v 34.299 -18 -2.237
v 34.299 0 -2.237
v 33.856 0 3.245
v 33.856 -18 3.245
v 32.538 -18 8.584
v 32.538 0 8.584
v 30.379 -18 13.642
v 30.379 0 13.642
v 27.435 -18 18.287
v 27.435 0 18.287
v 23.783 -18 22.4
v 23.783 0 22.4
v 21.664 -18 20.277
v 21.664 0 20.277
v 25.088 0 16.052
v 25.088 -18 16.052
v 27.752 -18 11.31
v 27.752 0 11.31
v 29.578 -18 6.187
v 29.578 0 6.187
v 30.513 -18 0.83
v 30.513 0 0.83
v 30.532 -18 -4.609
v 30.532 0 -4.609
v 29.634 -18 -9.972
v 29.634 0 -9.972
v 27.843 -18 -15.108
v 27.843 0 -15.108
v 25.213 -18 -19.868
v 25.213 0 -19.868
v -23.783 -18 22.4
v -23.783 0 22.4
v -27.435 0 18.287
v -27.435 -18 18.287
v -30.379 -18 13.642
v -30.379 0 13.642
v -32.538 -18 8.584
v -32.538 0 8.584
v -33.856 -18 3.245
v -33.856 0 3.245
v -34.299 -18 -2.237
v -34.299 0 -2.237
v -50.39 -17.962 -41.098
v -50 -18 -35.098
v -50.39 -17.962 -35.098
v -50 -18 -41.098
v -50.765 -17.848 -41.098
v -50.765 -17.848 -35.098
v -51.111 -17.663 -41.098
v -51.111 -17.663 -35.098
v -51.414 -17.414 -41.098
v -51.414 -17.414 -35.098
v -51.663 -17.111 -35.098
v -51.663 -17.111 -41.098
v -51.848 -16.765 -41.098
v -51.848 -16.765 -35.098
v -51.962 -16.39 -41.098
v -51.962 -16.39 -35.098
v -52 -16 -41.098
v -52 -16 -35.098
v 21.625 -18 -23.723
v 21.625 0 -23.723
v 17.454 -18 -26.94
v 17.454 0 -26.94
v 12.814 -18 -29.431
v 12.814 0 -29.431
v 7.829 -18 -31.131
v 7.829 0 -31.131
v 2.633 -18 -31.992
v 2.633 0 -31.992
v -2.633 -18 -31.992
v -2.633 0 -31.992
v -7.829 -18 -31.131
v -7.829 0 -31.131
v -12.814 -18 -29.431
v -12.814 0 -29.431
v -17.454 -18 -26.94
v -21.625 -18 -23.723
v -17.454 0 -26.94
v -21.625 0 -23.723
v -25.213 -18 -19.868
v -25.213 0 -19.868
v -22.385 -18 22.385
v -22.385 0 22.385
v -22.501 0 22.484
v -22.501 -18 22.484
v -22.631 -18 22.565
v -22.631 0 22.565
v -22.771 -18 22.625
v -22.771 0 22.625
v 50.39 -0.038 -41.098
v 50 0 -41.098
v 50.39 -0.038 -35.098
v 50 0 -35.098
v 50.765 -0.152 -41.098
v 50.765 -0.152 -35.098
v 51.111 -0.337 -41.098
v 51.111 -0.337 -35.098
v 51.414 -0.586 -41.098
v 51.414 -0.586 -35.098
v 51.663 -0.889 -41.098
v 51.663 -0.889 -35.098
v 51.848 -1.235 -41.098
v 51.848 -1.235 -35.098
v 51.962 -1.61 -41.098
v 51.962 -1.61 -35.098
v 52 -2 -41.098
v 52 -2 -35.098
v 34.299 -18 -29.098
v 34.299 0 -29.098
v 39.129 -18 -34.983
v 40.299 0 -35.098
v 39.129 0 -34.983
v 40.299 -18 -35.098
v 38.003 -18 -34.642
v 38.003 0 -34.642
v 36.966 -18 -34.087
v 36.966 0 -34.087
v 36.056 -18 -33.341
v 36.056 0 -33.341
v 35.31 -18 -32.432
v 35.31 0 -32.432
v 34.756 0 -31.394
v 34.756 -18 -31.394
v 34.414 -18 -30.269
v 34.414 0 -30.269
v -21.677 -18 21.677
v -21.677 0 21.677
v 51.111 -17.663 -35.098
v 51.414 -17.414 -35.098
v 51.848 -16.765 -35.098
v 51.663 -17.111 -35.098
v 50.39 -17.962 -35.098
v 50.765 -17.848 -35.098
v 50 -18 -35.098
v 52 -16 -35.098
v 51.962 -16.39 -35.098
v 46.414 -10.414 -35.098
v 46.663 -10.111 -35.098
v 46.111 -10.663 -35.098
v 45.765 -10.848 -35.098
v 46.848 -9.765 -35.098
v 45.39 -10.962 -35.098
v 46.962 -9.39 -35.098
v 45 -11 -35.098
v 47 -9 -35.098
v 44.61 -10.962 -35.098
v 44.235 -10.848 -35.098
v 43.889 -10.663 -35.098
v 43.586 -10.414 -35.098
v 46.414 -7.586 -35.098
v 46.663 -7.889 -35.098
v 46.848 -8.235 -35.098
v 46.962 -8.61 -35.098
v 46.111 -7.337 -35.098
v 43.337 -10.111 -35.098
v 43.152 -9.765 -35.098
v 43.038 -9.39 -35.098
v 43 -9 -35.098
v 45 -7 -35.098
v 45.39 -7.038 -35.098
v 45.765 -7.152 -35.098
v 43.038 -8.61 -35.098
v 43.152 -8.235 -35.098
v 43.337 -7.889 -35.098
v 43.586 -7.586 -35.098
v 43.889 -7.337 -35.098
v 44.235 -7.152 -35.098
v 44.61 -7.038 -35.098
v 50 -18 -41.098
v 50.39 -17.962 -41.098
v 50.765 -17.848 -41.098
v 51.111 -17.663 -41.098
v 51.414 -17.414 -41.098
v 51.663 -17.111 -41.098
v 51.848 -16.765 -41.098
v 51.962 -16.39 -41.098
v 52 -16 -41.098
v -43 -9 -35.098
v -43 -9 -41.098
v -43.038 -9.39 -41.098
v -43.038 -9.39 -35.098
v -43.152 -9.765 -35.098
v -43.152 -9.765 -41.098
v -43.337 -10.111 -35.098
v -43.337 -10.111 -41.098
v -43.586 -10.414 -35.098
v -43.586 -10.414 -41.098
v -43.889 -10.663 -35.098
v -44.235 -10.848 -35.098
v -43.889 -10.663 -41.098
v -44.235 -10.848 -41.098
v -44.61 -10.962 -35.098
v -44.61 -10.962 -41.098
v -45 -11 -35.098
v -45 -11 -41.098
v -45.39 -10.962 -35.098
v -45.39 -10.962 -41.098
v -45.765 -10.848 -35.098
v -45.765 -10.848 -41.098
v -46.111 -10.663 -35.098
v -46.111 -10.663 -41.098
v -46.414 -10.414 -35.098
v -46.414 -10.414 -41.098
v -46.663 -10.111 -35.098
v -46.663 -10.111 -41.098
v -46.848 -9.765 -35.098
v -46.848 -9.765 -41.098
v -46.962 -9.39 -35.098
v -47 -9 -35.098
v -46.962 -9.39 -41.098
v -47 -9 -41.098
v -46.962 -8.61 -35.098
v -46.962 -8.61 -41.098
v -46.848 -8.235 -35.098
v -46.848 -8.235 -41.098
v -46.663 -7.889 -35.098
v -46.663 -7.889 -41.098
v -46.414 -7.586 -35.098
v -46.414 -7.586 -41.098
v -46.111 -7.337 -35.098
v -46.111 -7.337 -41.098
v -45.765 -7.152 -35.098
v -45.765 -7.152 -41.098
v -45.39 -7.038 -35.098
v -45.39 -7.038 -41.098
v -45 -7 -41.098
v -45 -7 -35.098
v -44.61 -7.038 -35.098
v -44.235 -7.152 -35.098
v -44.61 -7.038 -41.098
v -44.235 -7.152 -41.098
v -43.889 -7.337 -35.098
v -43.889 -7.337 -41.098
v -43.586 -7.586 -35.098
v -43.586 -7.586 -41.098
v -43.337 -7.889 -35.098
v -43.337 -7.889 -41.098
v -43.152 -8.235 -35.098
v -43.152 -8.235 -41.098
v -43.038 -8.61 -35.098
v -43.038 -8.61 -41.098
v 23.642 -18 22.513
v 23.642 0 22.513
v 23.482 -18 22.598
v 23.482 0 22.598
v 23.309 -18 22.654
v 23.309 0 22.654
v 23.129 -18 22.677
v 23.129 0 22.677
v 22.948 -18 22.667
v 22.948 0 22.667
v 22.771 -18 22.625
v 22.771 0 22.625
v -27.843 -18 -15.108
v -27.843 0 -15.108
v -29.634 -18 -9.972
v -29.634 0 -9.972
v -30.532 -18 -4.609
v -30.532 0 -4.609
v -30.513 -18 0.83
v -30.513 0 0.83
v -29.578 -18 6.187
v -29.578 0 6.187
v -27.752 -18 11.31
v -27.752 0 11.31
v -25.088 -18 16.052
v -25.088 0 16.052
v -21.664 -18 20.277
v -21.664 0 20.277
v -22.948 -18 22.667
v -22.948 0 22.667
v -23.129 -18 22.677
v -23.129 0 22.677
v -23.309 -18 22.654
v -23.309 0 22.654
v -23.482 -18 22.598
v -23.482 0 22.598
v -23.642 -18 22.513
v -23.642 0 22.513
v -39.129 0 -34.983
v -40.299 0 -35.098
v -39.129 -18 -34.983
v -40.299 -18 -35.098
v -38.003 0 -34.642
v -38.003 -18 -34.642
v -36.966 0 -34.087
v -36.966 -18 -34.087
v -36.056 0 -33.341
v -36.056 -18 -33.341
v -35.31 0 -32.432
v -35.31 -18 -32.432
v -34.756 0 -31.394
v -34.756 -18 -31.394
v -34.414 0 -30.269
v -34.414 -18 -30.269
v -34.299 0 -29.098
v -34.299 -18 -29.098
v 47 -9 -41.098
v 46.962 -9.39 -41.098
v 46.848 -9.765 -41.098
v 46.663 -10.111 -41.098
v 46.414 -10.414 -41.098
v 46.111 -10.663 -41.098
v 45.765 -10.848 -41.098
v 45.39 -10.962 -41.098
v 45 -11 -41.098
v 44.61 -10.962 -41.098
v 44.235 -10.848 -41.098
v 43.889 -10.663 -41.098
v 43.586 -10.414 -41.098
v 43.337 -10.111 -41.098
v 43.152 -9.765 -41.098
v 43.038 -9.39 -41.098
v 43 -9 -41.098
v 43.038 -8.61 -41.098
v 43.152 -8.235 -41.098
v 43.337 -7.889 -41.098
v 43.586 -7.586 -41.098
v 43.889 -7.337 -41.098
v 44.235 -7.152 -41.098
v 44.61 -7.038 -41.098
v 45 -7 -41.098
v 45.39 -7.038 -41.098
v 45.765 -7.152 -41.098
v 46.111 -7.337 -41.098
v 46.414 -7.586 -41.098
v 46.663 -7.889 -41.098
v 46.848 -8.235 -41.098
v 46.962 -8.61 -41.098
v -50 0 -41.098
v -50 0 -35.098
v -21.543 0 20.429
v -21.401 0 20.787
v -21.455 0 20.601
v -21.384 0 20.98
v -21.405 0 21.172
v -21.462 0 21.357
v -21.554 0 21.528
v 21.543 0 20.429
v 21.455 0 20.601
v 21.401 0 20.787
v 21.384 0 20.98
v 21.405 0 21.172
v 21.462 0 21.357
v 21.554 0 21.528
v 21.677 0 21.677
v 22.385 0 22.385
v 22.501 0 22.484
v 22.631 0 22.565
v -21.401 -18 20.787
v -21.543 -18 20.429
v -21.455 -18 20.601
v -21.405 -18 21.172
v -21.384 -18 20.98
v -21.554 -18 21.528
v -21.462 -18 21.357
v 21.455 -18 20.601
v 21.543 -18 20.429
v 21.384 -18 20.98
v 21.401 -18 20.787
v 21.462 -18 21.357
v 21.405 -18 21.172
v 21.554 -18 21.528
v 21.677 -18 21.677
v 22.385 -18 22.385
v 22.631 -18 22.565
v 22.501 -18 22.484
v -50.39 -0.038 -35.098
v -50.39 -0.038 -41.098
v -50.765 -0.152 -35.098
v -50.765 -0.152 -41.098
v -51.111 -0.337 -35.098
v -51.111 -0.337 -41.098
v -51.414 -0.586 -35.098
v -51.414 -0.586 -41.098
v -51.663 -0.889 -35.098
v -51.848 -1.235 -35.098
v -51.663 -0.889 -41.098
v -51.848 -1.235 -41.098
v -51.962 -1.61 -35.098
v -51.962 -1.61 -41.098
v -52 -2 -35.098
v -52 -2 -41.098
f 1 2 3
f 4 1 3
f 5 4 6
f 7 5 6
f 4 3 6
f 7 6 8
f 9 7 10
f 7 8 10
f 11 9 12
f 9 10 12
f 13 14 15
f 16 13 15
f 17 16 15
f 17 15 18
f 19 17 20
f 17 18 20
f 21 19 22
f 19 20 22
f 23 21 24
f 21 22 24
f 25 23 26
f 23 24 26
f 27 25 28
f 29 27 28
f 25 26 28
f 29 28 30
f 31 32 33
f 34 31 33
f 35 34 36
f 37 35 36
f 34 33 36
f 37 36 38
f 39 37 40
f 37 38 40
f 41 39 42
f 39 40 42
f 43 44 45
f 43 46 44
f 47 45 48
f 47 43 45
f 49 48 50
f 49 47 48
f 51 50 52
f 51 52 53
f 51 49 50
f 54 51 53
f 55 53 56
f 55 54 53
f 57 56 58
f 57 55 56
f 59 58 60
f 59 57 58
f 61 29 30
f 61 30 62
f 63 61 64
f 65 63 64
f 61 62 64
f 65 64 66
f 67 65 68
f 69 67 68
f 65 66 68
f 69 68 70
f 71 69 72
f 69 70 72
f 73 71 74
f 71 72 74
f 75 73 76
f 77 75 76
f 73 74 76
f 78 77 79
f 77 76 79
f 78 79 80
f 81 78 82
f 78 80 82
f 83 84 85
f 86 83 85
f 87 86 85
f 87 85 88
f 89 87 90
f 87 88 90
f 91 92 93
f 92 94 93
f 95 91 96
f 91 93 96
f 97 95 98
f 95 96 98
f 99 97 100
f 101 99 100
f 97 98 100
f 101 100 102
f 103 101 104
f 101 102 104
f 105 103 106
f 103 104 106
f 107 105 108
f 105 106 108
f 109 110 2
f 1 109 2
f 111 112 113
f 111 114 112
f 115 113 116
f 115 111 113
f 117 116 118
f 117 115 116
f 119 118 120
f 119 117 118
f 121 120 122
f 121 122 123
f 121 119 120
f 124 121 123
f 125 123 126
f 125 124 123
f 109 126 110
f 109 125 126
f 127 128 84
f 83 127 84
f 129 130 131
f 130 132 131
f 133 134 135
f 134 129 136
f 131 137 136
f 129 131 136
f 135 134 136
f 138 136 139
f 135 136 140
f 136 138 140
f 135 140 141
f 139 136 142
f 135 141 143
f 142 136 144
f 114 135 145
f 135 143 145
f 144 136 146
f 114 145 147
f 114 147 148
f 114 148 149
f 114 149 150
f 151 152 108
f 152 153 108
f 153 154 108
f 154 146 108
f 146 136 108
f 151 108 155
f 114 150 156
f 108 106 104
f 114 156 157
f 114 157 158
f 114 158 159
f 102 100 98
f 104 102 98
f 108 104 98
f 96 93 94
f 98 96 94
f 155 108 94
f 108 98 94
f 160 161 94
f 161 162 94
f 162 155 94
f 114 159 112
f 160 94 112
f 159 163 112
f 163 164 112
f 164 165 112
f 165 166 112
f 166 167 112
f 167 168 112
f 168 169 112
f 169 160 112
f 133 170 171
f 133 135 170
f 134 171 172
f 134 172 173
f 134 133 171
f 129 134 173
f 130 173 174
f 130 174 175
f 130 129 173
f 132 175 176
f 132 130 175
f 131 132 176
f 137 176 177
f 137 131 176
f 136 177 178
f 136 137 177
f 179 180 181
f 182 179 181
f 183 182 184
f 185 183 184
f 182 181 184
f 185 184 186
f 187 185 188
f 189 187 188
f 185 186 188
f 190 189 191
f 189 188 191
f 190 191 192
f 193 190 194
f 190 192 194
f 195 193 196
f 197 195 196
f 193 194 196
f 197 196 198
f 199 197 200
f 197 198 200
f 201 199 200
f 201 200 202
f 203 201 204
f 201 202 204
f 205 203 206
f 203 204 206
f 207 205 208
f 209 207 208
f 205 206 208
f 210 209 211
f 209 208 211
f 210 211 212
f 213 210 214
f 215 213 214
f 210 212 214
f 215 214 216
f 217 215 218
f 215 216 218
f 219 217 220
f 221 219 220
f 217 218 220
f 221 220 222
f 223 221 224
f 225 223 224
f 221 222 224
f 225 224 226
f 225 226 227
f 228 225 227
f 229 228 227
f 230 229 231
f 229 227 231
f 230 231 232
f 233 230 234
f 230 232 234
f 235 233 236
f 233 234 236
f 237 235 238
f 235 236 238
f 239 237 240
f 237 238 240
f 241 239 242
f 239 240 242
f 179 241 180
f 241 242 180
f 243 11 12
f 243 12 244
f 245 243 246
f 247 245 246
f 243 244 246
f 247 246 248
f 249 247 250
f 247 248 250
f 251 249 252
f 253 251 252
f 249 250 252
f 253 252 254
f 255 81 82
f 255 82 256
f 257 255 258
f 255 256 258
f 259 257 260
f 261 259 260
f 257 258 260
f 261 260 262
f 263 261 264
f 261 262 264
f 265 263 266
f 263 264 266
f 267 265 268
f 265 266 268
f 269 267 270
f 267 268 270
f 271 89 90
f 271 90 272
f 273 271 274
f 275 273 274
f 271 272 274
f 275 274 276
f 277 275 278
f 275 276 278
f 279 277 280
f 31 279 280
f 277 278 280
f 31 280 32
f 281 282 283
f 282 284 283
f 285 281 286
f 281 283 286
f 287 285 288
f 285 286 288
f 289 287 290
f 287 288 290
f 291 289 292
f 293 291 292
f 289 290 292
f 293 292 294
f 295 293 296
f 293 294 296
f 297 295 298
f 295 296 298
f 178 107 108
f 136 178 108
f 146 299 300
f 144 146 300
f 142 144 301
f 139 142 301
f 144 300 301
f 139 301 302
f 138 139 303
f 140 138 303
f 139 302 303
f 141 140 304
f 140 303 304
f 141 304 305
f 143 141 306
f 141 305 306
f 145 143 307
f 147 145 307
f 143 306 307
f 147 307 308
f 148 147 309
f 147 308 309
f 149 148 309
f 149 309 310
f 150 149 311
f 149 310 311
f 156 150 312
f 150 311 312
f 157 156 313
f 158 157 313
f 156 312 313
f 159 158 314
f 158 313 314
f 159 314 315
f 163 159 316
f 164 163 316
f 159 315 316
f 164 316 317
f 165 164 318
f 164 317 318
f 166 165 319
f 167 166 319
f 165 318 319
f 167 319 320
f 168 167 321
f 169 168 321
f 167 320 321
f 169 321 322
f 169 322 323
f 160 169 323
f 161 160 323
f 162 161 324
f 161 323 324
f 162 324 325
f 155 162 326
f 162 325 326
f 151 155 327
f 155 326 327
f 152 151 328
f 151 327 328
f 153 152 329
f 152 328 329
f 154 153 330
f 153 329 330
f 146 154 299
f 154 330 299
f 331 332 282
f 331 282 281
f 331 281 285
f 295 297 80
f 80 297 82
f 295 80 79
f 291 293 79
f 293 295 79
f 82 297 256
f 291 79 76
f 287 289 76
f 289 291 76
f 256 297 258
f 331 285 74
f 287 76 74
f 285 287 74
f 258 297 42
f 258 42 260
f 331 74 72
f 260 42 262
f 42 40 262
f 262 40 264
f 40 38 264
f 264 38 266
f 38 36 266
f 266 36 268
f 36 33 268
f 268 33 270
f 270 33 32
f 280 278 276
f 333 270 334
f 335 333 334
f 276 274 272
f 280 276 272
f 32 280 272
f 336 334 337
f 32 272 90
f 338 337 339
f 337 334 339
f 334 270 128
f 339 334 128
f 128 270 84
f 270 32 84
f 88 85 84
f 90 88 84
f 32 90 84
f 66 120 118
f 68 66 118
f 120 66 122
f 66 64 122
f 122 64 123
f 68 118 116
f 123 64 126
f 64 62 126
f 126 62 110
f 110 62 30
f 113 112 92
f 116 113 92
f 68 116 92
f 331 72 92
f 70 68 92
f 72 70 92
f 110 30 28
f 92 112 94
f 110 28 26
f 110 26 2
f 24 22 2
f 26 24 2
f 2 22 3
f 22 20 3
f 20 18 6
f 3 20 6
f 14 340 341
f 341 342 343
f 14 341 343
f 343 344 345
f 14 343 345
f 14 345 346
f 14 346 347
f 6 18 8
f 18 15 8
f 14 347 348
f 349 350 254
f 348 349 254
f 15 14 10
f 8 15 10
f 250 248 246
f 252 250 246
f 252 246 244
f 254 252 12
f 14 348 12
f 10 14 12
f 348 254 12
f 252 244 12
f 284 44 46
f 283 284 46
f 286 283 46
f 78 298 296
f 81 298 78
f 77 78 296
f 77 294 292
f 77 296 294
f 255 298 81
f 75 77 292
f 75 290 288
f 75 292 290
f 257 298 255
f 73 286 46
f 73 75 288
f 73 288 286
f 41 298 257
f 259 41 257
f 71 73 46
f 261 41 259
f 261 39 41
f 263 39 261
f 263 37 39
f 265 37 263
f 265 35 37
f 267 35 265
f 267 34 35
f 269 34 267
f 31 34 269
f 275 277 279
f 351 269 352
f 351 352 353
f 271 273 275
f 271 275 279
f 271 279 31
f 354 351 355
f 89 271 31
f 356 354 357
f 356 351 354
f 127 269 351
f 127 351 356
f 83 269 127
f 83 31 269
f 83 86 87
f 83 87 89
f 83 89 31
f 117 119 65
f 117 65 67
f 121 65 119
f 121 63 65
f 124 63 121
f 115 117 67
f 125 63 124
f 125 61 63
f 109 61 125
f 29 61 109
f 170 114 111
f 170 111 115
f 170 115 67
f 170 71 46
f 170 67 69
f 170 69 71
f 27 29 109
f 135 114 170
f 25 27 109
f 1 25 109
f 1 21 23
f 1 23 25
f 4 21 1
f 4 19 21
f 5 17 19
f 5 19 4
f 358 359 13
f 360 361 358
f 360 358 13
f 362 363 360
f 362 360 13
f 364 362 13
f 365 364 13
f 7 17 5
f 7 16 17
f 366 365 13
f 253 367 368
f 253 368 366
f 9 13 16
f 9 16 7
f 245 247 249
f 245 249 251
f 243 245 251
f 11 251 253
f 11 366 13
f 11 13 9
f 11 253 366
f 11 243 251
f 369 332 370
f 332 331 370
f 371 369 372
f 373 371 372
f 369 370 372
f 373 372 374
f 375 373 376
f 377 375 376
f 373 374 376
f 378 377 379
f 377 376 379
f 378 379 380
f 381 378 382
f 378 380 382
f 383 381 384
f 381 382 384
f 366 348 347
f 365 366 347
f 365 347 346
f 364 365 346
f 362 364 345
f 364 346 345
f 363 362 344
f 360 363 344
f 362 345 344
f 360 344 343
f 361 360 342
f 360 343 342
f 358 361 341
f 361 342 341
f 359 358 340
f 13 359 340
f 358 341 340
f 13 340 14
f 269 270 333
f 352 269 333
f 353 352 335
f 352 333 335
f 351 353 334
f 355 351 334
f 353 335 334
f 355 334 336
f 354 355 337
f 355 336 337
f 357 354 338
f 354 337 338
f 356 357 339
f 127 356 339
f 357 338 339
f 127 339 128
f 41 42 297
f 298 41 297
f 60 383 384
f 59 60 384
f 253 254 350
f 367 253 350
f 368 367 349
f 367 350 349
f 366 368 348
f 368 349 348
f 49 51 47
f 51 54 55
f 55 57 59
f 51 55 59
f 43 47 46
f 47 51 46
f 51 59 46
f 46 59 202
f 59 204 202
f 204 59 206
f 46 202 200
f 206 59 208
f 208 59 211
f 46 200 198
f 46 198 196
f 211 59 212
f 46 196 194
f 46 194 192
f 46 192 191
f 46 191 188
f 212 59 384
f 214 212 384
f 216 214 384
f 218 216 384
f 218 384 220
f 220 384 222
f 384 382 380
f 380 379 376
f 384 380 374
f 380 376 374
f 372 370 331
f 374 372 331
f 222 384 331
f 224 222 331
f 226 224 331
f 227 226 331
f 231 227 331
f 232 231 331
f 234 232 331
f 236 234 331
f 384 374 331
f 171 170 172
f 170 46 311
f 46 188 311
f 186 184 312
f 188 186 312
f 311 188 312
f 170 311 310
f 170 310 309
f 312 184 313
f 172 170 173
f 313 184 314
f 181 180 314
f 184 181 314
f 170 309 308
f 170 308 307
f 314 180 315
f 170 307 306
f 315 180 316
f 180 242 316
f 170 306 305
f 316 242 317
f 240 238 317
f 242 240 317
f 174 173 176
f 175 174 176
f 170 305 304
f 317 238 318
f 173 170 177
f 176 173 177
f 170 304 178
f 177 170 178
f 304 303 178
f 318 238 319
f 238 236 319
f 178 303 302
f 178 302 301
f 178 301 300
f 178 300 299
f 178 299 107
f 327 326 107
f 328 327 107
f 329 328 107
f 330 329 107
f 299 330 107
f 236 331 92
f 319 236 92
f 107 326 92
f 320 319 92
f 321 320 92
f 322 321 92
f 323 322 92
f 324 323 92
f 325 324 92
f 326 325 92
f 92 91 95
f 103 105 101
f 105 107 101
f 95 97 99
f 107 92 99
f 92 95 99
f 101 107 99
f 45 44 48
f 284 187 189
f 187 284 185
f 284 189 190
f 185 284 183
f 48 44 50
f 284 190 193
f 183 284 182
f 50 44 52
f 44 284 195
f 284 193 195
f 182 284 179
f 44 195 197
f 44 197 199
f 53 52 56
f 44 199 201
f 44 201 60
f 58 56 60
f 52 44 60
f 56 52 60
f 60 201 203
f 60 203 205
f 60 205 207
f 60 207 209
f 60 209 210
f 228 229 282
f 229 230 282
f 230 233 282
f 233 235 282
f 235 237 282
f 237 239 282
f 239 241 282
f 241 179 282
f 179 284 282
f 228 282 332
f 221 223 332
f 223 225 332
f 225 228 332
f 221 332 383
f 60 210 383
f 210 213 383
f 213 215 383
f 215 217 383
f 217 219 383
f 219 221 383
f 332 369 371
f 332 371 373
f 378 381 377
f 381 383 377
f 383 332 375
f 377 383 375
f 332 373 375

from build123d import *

# Parameters (mm, degrees)
F1_DEPTH = 18
F2_R     = 2
F3_DEPTH = 6
F4_R     = 2
F5_R     = 6


with BuildPart() as f1:
    # F0 (on Front) → F1 (new body)
    with BuildSketch(Plane.XZ):
        with BuildLine():
            ThreePointArc((25.212652, -19.867868), (0, -32.1), (-25.212652, -19.867868))
            ThreePointArc((-25.212652, -19.867868), (-30.513321, 0.829972), (-21.663506, 20.276783))
            ThreePointArc((-21.663506, 20.276783), (-21.384271, 20.979731), (-21.677117, 21.677117))
            Line((-21.677117, 21.677117), (-22.384578, 22.384578))
            ThreePointArc((-22.384578, 22.384578), (-22.564076, 22.526959), (-22.77127, 22.624748))
            ThreePointArc((-22.77127, 22.624748), (-23.308835, 22.653609), (-23.783467, 22.399576))
            ThreePointArc((-23.783467, 22.399576), (-31.56023, 11.156534), (-34.29906, -2.236855))
            Line((-34.29906, -2.236855), (-34.29906, -35.098328))
            Line((-34.29906, -35.098328), (-52, -35.098328))
            Line((-52, -35.098328), (-52, -41.098328))
            Line((-52, -41.098328), (0, -41.098328))
            Line((0, -41.098328), (52, -41.098328))
            Line((52, -41.098328), (52, -35.098328))
            Line((52, -35.098328), (34.29906, -35.098328))
            Line((34.29906, -35.098328), (34.29906, -2.236855))
            ThreePointArc((34.29906, -2.236855), (31.56023, 11.156534), (23.783467, 22.399576))
            ThreePointArc((23.783467, 22.399576), (23.308835, 22.653609), (22.77127, 22.624748))
            ThreePointArc((22.77127, 22.624748), (22.564076, 22.526959), (22.384578, 22.384578))
            Line((22.384578, 22.384578), (21.677117, 21.677117))
            ThreePointArc((21.677117, 21.677117), (21.384271, 20.979731), (21.663506, 20.276783))
            ThreePointArc((21.663506, 20.276783), (30.513321, 0.829972), (25.212652, -19.867868))
        make_face()
    extrude(amount=F1_DEPTH)

    # F2 (on face) → F3 (cut, through all)
    with BuildSketch(Plane(origin=(0, 0, -41.098328), x_dir=(1, 0, 0), z_dir=(0, 0, -1))):
        with Locations((-45, 9)):
            Circle(F2_R)
        with Locations((45, 9)):
            Circle(F2_R)
    extrude(amount=-F3_DEPTH, mode=Mode.SUBTRACT)

    # F4
    f4_edges = [f1.edges().sort_by_distance(p)[0] for p in [
        (-52, 0, -38.098328),
        (-52, -18, -38.098328),
        (52, -18, -38.098328),
        (52, 0, -38.098328),
    ]]
    fillet(f4_edges, radius=F4_R)

    # F5
    f5_edges = [f1.edges().sort_by_distance(p)[0] for p in [
        (-34.29906, -9, -35.098328),
        (34.29906, -9, -35.098328),
    ]]
    fillet(f5_edges, radius=F5_R)


solid = f1.part
